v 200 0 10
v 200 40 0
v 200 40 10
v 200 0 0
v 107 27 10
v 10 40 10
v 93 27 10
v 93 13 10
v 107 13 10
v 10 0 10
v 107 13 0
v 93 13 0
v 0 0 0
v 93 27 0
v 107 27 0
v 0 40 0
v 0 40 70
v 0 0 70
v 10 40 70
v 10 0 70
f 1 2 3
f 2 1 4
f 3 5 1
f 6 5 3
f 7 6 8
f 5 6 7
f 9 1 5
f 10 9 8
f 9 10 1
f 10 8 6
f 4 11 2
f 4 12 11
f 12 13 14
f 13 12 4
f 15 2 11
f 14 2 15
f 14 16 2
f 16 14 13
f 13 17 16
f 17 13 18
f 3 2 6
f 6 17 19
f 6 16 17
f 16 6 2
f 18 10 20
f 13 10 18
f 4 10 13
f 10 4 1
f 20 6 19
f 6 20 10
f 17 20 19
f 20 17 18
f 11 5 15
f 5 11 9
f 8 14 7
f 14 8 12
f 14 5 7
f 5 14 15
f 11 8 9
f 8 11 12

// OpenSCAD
$fn = 32;

// ----------------------------------------------------------------------
// Gantry bracket: 200-250 mm L bracket
// ----------------------------------------------------------------------

// --- parameters (mm) ---
base_l = 200;             // base arm length, X
arm_w = 40;               // arm width, Y
thick = 10;               // arm thickness
up_h = 60;                // vertical arm height, Z
slot_w = 14;              // adjustment slot width in the base

total_h = up_h + thick;  // overall height

difference() {
  union() {
    cube([base_l, arm_w, thick]);
    cube([thick, arm_w, total_h]);
  }
  translate([base_l / 2 - slot_w / 2, arm_w / 2 - slot_w / 2, -1])
    cube([slot_w, slot_w, thick + 2]);
}
